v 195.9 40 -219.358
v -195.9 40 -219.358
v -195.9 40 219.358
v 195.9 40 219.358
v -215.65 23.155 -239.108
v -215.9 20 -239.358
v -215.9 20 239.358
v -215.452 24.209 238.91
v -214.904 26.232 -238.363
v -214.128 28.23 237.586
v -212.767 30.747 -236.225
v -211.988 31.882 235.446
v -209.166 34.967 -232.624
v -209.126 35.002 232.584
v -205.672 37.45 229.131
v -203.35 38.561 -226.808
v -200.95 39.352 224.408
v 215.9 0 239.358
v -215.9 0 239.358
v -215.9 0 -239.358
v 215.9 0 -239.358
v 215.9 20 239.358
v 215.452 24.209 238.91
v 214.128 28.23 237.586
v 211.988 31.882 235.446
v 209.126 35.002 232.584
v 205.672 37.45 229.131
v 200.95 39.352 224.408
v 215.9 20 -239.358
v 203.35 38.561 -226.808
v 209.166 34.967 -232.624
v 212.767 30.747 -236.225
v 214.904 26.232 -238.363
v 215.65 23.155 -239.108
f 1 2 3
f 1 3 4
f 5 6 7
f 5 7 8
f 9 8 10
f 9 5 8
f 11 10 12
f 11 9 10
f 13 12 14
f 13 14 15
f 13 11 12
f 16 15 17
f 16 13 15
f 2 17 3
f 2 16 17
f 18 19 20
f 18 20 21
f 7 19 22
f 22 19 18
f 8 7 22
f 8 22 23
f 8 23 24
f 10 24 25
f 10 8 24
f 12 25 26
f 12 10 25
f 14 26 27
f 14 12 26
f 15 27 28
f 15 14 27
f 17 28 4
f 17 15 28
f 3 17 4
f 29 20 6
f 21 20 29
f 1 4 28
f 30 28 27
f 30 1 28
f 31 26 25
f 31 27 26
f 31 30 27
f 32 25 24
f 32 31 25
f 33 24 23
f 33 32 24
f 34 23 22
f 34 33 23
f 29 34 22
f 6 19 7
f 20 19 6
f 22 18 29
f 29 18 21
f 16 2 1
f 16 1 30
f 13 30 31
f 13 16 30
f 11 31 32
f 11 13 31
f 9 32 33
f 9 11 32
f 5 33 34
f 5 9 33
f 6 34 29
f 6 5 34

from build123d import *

# Parameters (mm, degrees)
SKETCH1_W           = 431.8
SKETCH1_H           = 478.71644455
BOSS_EXTRUDE1_DEPTH = 40
FILLET1_START       = -215.9
FILLET1_DEPTH       = 431.8
FILLET1_START_2     = -240
FILLET1_2_DEPTH     = 480


with BuildPart() as part:
    # Sketch1 → Boss-Extrude1 (new body)
    with BuildSketch(Plane(origin=(0, 0, 0), x_dir=(1, 0, 0), z_dir=(0, 1, 0))):
        Rectangle(SKETCH1_W, SKETCH1_H)
    extrude(amount=BOSS_EXTRUDE1_DEPTH)

    # Fillet1: read off the stored shape, not the designer's step
    # Fillet1 outline → Fillet1 (cut)
    with BuildSketch(Plane.YZ.offset(FILLET1_START)):
        with BuildLine():
            Line((40, -239.358222275), (40, -219.358222275))
            ThreePointArc((40, -219.358222275), (34.142135624, -233.500357899), (20, -239.358222275))
            Line((20, -239.358222275), (40, -239.358222275))
        make_face()
        with BuildLine():
            ThreePointArc((20, 239.358222275), (34.142135624, 233.500357899), (40, 219.358222275))
            Line((40, 219.358222275), (40, 239.358222275))
            Line((40, 239.358222275), (20, 239.358222275))
        make_face()
    extrude(amount=FILLET1_DEPTH, mode=Mode.SUBTRACT)

    # Fillet1 2 outline → Fillet1 2 (cut)
    with BuildSketch(Plane.XY.offset(FILLET1_START_2)):
        with BuildLine():
            Line((215.9, 40), (195.9, 40))
            ThreePointArc((195.9, 40), (210.042135624, 34.142135624), (215.9, 20))
            Line((215.9, 20), (215.9, 40))
        make_face()
        with BuildLine():
            ThreePointArc((-215.9, 20), (-210.042135624, 34.142135624), (-195.9, 40))
            Line((-195.9, 40), (-215.9, 40))
            Line((-215.9, 40), (-215.9, 20))
        make_face()
    extrude(amount=FILLET1_2_DEPTH, mode=Mode.SUBTRACT)


solid = part.part
